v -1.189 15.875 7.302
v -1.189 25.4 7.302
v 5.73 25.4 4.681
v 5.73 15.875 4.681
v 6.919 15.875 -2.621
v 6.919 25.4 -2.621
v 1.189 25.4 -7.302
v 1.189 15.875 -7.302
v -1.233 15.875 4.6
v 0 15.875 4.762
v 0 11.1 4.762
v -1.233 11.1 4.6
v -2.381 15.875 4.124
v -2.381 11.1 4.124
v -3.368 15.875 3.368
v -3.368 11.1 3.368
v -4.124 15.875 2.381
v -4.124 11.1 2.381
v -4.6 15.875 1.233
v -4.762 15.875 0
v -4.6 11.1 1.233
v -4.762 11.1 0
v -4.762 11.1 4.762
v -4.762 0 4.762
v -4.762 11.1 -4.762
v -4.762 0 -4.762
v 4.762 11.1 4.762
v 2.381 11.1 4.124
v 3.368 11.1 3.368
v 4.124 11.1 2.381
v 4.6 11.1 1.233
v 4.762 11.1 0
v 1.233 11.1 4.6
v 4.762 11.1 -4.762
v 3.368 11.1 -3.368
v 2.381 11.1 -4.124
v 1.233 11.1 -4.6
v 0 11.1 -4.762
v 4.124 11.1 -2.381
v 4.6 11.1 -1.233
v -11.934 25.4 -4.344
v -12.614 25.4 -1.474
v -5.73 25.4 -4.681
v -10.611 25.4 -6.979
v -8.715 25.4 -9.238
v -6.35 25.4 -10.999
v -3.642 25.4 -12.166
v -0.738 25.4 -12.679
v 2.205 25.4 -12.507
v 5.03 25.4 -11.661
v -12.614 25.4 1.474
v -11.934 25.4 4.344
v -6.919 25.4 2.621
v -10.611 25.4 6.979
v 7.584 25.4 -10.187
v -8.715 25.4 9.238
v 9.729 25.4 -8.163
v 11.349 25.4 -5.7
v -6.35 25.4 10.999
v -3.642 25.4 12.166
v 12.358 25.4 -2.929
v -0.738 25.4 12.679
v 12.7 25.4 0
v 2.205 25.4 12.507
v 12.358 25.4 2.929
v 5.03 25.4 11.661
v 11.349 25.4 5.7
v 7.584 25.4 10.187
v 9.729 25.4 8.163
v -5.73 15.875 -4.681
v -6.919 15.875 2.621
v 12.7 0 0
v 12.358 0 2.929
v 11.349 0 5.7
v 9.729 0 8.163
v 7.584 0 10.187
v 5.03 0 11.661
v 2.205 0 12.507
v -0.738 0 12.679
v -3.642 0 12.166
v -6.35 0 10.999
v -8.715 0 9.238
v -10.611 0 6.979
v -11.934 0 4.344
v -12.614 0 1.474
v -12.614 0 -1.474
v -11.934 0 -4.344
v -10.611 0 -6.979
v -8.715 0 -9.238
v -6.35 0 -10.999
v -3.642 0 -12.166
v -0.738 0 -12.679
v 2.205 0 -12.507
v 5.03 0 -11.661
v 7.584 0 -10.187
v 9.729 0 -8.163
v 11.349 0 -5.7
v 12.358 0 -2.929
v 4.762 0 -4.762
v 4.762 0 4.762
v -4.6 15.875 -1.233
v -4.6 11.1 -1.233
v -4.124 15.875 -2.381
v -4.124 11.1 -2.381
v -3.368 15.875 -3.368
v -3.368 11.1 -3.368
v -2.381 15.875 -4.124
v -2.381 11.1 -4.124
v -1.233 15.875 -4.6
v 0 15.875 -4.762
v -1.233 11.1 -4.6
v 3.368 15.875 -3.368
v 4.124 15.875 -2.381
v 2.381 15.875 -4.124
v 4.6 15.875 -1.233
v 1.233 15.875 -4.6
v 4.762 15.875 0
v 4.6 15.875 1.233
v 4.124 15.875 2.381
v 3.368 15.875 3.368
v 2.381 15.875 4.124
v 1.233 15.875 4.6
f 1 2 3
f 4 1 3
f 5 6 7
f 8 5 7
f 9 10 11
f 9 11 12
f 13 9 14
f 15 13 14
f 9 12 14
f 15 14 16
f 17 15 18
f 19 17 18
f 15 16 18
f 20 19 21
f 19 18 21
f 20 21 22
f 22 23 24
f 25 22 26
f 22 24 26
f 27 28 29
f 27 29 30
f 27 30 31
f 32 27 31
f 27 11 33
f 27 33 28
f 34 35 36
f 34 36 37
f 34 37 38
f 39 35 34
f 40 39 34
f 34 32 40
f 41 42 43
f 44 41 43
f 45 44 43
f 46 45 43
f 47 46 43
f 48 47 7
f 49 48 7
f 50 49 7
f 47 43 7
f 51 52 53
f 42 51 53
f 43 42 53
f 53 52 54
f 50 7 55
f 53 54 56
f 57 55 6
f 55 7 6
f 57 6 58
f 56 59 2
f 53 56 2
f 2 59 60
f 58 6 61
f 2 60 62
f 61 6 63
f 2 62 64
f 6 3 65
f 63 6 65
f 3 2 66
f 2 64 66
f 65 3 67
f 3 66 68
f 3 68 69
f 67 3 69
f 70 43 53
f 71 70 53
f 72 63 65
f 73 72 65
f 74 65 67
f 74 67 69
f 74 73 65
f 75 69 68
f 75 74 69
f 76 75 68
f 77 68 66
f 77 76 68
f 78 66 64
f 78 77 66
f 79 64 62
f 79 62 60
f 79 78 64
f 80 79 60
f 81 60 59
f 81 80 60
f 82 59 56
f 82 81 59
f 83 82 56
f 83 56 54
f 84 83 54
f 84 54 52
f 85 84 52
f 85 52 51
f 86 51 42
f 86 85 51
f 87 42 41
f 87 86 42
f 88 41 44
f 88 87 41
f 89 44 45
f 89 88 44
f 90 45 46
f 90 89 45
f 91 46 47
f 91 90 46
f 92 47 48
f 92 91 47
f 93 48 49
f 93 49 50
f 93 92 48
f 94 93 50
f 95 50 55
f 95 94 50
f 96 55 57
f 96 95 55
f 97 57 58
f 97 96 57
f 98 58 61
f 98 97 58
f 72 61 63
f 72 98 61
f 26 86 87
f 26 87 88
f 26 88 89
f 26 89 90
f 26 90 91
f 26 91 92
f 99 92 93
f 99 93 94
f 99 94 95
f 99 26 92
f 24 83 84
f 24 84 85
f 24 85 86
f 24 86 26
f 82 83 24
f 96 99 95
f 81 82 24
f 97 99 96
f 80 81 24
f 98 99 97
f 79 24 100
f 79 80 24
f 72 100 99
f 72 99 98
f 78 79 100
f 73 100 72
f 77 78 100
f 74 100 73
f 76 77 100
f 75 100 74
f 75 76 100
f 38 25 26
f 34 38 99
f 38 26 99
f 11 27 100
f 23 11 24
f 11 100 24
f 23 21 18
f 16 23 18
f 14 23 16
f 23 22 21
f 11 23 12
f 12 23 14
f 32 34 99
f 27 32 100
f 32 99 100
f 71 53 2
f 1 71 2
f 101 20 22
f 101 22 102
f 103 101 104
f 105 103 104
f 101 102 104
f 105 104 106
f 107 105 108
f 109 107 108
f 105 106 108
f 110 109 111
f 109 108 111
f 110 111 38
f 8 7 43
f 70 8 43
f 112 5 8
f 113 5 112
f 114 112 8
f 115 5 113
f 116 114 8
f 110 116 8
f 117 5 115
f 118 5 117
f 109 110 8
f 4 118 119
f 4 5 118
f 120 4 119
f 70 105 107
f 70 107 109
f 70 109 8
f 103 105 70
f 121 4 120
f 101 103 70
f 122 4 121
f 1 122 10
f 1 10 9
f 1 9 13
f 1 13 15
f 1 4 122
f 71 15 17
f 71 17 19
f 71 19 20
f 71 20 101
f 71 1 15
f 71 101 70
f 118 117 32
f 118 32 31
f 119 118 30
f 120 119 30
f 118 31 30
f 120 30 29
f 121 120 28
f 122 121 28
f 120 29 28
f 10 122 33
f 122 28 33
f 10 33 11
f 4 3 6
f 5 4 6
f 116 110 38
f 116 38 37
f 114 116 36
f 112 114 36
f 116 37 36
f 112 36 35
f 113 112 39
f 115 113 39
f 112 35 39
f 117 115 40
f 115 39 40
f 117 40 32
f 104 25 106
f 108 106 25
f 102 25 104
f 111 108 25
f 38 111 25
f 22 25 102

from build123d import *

# Parameters (mm, degrees)
F0_R     = 12.7
F1_DEPTH = 25.4
F3_DEPTH = 25.401
F4_DEPTH = 11.0998
F6_DEPTH = 9.525


with BuildPart() as f1:
    # F0 (on Front) → F1 (new body)
    with BuildSketch(Plane.XZ):
        Circle(F0_R)
    extrude(amount=-F1_DEPTH)

    # F2 (on Front) → F3 (cut, through all)
    with BuildSketch(Plane.XZ):
        with BuildLine():
            ThreePointArc((-4.7625, 0), (-3.367596, -3.367596), (0, -4.7625))
            ThreePointArc((0, -4.7625), (3.367596, -3.367596), (4.7625, 0))
            ThreePointArc((4.7625, 0), (3.367596, 3.367596), (0, 4.7625))
            ThreePointArc((0, 4.7625), (-3.367596, 3.367596), (-4.7625, 0))
        make_face()
    extrude(amount=-F3_DEPTH, mode=Mode.SUBTRACT)

    # F2 (on Front) → F4 (cut)
    with BuildSketch(Plane.XZ):
        with BuildLine():
            Line((0, -4.7625), (4.7625, -4.7625))
            Line((4.7625, -4.7625), (4.7625, 0))
            ThreePointArc((4.7625, 0), (3.367596, -3.367596), (0, -4.7625))
        make_face()
        with BuildLine():
            Line((-4.7625, -4.7625), (0, -4.7625))
            ThreePointArc((0, -4.7625), (-3.367596, -3.367596), (-4.7625, 0))
            Line((-4.7625, 0), (-4.7625, -4.7625))
        make_face()
        with BuildLine():
            ThreePointArc((0, 4.7625), (3.367596, 3.367596), (4.7625, 0))
            Line((4.7625, 0), (4.7625, 4.7625))
            Line((4.7625, 4.7625), (0, 4.7625))
        make_face()
        with BuildLine():
            Line((-4.7625, 4.7625), (-4.7625, 0))
            ThreePointArc((-4.7625, 0), (-3.367596, 3.367596), (0, 4.7625))
            Line((0, 4.7625), (-4.7625, 4.7625))
        make_face()
    extrude(amount=-F4_DEPTH, mode=Mode.SUBTRACT)

    # F5 (on face) → F6 (cut)
    with BuildSketch(Plane(origin=(0, 25.4, 0), x_dir=(-1, 0, 0), z_dir=(0, 1, 0))):
        Polygon((-6.918703, -2.621455), (-1.189105, -7.3025), (5.729598, -4.681045), (6.918703, 2.621455), (1.189105, 7.3025), (-5.729598, 4.681045), align=None)
    extrude(amount=-F6_DEPTH, mode=Mode.SUBTRACT)


solid = f1.part
